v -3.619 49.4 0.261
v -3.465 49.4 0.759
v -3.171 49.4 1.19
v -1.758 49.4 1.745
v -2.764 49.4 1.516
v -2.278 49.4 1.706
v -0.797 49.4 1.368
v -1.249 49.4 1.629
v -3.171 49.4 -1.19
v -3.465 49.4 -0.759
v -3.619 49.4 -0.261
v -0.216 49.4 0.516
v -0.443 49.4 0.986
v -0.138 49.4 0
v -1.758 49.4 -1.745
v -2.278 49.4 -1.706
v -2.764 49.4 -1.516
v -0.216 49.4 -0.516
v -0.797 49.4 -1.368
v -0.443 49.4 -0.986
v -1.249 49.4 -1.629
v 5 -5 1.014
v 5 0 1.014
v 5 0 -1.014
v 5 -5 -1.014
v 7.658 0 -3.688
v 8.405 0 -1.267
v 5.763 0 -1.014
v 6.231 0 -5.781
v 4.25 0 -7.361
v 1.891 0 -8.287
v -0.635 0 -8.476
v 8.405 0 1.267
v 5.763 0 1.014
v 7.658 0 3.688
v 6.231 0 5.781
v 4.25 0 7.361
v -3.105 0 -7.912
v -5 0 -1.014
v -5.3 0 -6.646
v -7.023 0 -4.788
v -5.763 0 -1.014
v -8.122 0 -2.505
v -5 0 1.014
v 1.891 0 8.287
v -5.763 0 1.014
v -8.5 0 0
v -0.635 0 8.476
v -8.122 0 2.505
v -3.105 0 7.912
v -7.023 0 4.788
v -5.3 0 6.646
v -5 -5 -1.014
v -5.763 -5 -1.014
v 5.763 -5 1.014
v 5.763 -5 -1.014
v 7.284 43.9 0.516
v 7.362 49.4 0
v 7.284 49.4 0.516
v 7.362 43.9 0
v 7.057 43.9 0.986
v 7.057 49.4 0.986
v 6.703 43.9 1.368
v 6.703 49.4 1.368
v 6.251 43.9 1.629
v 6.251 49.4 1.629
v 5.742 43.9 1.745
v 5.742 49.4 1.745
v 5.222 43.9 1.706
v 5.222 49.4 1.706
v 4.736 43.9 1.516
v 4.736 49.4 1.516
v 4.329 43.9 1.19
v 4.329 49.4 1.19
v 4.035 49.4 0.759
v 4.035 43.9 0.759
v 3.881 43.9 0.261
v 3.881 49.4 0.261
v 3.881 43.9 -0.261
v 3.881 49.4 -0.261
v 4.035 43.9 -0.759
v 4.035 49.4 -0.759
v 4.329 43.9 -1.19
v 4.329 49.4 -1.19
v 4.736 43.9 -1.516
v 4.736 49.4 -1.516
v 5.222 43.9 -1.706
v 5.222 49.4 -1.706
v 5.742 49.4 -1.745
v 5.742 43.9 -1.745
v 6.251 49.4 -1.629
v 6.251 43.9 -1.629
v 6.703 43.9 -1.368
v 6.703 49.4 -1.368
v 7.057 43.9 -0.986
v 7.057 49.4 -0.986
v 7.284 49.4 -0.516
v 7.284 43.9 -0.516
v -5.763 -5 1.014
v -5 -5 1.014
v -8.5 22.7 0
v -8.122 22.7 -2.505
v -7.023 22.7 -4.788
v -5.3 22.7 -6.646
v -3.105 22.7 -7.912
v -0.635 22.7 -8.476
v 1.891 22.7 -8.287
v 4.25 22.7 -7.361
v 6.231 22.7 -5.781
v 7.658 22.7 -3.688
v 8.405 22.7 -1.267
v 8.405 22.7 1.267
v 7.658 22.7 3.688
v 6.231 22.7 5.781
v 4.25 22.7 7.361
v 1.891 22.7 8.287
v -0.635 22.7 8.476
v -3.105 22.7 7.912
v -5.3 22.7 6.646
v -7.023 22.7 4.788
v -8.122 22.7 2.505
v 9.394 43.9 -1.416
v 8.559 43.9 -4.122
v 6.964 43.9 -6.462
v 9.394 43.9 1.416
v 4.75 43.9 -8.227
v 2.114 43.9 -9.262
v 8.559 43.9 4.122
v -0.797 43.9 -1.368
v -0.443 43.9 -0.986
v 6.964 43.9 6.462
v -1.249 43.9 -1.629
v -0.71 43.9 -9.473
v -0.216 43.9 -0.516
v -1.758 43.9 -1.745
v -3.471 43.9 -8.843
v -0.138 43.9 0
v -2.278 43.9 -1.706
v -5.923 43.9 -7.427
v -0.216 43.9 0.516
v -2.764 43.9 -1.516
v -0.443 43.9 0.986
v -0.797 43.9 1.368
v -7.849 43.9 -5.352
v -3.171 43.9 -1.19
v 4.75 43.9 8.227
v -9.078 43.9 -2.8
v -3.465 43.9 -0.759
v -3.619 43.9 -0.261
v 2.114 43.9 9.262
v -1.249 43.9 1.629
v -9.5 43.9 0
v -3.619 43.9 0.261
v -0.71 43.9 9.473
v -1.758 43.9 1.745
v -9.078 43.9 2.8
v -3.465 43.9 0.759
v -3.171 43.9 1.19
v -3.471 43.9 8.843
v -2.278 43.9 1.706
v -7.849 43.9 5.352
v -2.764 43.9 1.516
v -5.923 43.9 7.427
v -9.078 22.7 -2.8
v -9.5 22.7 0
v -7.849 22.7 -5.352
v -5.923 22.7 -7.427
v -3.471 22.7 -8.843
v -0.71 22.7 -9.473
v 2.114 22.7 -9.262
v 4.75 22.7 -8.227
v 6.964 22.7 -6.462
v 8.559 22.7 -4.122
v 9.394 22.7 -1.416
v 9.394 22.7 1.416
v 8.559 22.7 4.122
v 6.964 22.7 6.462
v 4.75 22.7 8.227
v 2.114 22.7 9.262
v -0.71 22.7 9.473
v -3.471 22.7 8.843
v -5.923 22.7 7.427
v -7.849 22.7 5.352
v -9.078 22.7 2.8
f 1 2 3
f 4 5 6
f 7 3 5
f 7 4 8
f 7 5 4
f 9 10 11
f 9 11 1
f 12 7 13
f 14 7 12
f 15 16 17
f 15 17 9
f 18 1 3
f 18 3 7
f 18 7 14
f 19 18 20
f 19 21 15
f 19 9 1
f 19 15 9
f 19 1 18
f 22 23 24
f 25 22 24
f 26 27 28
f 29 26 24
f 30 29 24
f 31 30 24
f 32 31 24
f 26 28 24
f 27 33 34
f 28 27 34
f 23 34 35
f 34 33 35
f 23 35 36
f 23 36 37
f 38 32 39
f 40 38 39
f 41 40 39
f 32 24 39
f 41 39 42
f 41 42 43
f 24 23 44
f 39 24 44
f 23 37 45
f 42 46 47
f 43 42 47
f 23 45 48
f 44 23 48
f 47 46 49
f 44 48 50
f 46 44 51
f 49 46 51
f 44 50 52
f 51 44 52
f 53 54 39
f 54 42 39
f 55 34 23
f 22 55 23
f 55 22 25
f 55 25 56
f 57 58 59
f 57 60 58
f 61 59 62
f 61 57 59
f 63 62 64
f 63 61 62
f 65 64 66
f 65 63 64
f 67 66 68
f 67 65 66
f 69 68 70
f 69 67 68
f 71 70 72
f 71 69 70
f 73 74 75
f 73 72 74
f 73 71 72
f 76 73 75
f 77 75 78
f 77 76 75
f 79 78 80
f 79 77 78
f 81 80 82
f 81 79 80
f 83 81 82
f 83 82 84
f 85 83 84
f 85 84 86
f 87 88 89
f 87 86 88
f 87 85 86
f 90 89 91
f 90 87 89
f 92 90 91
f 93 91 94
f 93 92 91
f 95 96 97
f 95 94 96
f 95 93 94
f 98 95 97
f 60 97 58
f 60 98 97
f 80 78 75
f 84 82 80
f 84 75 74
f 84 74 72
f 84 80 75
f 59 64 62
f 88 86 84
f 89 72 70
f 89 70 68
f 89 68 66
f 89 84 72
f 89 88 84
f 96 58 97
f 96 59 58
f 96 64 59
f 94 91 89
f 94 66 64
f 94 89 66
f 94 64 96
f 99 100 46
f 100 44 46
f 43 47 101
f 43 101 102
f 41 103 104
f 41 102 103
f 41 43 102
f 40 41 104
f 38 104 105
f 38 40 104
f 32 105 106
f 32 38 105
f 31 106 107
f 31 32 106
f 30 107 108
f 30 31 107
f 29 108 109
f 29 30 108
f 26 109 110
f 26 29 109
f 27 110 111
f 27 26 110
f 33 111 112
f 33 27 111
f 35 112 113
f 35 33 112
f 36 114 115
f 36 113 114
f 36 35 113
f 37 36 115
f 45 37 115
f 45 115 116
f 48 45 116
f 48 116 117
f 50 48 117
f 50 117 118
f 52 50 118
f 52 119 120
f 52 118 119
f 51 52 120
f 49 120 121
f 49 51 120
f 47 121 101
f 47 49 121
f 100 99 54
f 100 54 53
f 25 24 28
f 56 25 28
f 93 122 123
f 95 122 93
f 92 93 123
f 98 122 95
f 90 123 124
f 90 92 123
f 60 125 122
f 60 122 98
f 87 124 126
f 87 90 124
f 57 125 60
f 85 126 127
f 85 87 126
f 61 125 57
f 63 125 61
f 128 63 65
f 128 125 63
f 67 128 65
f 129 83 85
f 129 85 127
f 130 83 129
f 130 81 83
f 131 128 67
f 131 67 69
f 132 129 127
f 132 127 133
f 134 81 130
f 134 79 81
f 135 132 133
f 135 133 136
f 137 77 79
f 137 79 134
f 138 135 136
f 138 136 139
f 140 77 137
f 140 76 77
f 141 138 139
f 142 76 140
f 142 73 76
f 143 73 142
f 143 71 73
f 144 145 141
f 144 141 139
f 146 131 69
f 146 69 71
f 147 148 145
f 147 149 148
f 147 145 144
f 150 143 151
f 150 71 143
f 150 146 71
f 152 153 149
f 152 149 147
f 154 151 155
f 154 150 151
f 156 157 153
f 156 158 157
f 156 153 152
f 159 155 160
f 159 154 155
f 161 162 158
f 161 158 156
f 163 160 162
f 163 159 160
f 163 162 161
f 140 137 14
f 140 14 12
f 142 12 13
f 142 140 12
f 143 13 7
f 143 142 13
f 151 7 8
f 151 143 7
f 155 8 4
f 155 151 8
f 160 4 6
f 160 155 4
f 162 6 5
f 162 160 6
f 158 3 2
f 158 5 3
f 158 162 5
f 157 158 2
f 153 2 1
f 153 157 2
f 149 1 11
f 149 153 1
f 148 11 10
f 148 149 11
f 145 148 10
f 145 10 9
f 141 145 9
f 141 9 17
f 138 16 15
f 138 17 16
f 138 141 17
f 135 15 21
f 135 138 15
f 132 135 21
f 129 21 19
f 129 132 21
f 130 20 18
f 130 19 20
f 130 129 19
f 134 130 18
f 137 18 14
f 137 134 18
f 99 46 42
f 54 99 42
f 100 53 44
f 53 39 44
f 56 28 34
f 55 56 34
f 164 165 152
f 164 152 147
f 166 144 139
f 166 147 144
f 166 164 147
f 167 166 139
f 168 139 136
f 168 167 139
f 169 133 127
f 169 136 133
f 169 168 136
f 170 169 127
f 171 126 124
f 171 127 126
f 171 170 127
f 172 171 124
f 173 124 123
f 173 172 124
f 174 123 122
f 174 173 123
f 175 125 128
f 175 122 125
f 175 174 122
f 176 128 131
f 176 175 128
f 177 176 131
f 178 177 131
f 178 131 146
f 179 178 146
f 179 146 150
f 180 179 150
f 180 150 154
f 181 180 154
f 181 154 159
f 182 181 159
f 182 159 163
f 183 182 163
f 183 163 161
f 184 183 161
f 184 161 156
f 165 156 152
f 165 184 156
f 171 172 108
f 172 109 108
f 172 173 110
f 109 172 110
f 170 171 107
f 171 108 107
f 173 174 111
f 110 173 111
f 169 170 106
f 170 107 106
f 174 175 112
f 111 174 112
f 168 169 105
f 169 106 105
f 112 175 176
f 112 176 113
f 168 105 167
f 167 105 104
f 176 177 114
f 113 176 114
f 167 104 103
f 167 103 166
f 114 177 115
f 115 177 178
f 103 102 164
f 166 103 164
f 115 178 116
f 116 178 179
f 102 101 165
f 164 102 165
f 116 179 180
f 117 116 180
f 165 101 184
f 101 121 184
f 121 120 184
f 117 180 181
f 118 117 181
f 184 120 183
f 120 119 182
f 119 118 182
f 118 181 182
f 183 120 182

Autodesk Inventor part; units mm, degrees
ref_plane "YZ Plane" through (0, 0, 0) normal (1, 0, 0) x (0, 1, 0)
ref_plane "XZ Plane" through (0, 0, 0) normal (0, 1, 0) x (-1, 0, 0)
ref_plane "XY Plane" through (0, 0, 0) normal (0, 0, 1) x (1, 0, 0)
sketch "Skizze1" plane through (0, 0, 0) normal (0, 0, 1) x (1, 0, 0)
  line L0 (0, 0) -> (0, 47.086)
  line L1 (0, 43.9) -> (-9.5, 43.9)
  line L2 (-9.5, 43.9) -> (-9.5, 22.7)
  line L3 (-9.5, 22.7) -> (-8.5, 22.7)
  line L4 (-8.5, 22.7) -> (-8.5, 0)
  line L5 (-8.5, 0) -> (0, 0)
  dimension "d0" = 19
  dimension "d1" = 17
  dimension "d2" = 43.9
  dimension "d3" = 21.2
revolve "Umdrehung1" add sketch "Skizze1" angle 360 about axis through (0, 0, 0) along (0, 1, 0)
sketch "Skizze2" plane through (0, 0, 0) normal (0, -1, 0) x (1, 0, 0)
  line L0 (5.7629, 1.0144) -> (5, 1.0144)
  line L1 (5, 1.0144) -> (5, -1.0144)
  line L2 (5, -1.0144) -> (5.7629, -1.0144)
  line L3 (5.7629, -1.0144) -> (5.7629, 1.0144)
  point P0 (0, 0)
  point P1 (5.7629, 0)
  dimension "d5" = 5
extrude "Extrusion1" add sketch "Skizze2" along normal blind 5
mirror "Spiegeln1" about plane through (0, 0, 0) normal (1, 0, 0) of "Extrusion1"
sketch "Skizze3" plane through (0, 43.9, 0) normal (0, 1, 0) x (1, 0, 0)
  circle A0 centre (-1.8885, 0) radius 1.75
  circle A1 centre (5.6115, 0) radius 1.75
  point P0 (0, 0)
  dimension "d8" = 7.5
  dimension "d9" = 3.5
extrude "Extrusion2" add sketch "Skizze3" along normal blind 5.5
properties part number "Pumpe_Dummy"
